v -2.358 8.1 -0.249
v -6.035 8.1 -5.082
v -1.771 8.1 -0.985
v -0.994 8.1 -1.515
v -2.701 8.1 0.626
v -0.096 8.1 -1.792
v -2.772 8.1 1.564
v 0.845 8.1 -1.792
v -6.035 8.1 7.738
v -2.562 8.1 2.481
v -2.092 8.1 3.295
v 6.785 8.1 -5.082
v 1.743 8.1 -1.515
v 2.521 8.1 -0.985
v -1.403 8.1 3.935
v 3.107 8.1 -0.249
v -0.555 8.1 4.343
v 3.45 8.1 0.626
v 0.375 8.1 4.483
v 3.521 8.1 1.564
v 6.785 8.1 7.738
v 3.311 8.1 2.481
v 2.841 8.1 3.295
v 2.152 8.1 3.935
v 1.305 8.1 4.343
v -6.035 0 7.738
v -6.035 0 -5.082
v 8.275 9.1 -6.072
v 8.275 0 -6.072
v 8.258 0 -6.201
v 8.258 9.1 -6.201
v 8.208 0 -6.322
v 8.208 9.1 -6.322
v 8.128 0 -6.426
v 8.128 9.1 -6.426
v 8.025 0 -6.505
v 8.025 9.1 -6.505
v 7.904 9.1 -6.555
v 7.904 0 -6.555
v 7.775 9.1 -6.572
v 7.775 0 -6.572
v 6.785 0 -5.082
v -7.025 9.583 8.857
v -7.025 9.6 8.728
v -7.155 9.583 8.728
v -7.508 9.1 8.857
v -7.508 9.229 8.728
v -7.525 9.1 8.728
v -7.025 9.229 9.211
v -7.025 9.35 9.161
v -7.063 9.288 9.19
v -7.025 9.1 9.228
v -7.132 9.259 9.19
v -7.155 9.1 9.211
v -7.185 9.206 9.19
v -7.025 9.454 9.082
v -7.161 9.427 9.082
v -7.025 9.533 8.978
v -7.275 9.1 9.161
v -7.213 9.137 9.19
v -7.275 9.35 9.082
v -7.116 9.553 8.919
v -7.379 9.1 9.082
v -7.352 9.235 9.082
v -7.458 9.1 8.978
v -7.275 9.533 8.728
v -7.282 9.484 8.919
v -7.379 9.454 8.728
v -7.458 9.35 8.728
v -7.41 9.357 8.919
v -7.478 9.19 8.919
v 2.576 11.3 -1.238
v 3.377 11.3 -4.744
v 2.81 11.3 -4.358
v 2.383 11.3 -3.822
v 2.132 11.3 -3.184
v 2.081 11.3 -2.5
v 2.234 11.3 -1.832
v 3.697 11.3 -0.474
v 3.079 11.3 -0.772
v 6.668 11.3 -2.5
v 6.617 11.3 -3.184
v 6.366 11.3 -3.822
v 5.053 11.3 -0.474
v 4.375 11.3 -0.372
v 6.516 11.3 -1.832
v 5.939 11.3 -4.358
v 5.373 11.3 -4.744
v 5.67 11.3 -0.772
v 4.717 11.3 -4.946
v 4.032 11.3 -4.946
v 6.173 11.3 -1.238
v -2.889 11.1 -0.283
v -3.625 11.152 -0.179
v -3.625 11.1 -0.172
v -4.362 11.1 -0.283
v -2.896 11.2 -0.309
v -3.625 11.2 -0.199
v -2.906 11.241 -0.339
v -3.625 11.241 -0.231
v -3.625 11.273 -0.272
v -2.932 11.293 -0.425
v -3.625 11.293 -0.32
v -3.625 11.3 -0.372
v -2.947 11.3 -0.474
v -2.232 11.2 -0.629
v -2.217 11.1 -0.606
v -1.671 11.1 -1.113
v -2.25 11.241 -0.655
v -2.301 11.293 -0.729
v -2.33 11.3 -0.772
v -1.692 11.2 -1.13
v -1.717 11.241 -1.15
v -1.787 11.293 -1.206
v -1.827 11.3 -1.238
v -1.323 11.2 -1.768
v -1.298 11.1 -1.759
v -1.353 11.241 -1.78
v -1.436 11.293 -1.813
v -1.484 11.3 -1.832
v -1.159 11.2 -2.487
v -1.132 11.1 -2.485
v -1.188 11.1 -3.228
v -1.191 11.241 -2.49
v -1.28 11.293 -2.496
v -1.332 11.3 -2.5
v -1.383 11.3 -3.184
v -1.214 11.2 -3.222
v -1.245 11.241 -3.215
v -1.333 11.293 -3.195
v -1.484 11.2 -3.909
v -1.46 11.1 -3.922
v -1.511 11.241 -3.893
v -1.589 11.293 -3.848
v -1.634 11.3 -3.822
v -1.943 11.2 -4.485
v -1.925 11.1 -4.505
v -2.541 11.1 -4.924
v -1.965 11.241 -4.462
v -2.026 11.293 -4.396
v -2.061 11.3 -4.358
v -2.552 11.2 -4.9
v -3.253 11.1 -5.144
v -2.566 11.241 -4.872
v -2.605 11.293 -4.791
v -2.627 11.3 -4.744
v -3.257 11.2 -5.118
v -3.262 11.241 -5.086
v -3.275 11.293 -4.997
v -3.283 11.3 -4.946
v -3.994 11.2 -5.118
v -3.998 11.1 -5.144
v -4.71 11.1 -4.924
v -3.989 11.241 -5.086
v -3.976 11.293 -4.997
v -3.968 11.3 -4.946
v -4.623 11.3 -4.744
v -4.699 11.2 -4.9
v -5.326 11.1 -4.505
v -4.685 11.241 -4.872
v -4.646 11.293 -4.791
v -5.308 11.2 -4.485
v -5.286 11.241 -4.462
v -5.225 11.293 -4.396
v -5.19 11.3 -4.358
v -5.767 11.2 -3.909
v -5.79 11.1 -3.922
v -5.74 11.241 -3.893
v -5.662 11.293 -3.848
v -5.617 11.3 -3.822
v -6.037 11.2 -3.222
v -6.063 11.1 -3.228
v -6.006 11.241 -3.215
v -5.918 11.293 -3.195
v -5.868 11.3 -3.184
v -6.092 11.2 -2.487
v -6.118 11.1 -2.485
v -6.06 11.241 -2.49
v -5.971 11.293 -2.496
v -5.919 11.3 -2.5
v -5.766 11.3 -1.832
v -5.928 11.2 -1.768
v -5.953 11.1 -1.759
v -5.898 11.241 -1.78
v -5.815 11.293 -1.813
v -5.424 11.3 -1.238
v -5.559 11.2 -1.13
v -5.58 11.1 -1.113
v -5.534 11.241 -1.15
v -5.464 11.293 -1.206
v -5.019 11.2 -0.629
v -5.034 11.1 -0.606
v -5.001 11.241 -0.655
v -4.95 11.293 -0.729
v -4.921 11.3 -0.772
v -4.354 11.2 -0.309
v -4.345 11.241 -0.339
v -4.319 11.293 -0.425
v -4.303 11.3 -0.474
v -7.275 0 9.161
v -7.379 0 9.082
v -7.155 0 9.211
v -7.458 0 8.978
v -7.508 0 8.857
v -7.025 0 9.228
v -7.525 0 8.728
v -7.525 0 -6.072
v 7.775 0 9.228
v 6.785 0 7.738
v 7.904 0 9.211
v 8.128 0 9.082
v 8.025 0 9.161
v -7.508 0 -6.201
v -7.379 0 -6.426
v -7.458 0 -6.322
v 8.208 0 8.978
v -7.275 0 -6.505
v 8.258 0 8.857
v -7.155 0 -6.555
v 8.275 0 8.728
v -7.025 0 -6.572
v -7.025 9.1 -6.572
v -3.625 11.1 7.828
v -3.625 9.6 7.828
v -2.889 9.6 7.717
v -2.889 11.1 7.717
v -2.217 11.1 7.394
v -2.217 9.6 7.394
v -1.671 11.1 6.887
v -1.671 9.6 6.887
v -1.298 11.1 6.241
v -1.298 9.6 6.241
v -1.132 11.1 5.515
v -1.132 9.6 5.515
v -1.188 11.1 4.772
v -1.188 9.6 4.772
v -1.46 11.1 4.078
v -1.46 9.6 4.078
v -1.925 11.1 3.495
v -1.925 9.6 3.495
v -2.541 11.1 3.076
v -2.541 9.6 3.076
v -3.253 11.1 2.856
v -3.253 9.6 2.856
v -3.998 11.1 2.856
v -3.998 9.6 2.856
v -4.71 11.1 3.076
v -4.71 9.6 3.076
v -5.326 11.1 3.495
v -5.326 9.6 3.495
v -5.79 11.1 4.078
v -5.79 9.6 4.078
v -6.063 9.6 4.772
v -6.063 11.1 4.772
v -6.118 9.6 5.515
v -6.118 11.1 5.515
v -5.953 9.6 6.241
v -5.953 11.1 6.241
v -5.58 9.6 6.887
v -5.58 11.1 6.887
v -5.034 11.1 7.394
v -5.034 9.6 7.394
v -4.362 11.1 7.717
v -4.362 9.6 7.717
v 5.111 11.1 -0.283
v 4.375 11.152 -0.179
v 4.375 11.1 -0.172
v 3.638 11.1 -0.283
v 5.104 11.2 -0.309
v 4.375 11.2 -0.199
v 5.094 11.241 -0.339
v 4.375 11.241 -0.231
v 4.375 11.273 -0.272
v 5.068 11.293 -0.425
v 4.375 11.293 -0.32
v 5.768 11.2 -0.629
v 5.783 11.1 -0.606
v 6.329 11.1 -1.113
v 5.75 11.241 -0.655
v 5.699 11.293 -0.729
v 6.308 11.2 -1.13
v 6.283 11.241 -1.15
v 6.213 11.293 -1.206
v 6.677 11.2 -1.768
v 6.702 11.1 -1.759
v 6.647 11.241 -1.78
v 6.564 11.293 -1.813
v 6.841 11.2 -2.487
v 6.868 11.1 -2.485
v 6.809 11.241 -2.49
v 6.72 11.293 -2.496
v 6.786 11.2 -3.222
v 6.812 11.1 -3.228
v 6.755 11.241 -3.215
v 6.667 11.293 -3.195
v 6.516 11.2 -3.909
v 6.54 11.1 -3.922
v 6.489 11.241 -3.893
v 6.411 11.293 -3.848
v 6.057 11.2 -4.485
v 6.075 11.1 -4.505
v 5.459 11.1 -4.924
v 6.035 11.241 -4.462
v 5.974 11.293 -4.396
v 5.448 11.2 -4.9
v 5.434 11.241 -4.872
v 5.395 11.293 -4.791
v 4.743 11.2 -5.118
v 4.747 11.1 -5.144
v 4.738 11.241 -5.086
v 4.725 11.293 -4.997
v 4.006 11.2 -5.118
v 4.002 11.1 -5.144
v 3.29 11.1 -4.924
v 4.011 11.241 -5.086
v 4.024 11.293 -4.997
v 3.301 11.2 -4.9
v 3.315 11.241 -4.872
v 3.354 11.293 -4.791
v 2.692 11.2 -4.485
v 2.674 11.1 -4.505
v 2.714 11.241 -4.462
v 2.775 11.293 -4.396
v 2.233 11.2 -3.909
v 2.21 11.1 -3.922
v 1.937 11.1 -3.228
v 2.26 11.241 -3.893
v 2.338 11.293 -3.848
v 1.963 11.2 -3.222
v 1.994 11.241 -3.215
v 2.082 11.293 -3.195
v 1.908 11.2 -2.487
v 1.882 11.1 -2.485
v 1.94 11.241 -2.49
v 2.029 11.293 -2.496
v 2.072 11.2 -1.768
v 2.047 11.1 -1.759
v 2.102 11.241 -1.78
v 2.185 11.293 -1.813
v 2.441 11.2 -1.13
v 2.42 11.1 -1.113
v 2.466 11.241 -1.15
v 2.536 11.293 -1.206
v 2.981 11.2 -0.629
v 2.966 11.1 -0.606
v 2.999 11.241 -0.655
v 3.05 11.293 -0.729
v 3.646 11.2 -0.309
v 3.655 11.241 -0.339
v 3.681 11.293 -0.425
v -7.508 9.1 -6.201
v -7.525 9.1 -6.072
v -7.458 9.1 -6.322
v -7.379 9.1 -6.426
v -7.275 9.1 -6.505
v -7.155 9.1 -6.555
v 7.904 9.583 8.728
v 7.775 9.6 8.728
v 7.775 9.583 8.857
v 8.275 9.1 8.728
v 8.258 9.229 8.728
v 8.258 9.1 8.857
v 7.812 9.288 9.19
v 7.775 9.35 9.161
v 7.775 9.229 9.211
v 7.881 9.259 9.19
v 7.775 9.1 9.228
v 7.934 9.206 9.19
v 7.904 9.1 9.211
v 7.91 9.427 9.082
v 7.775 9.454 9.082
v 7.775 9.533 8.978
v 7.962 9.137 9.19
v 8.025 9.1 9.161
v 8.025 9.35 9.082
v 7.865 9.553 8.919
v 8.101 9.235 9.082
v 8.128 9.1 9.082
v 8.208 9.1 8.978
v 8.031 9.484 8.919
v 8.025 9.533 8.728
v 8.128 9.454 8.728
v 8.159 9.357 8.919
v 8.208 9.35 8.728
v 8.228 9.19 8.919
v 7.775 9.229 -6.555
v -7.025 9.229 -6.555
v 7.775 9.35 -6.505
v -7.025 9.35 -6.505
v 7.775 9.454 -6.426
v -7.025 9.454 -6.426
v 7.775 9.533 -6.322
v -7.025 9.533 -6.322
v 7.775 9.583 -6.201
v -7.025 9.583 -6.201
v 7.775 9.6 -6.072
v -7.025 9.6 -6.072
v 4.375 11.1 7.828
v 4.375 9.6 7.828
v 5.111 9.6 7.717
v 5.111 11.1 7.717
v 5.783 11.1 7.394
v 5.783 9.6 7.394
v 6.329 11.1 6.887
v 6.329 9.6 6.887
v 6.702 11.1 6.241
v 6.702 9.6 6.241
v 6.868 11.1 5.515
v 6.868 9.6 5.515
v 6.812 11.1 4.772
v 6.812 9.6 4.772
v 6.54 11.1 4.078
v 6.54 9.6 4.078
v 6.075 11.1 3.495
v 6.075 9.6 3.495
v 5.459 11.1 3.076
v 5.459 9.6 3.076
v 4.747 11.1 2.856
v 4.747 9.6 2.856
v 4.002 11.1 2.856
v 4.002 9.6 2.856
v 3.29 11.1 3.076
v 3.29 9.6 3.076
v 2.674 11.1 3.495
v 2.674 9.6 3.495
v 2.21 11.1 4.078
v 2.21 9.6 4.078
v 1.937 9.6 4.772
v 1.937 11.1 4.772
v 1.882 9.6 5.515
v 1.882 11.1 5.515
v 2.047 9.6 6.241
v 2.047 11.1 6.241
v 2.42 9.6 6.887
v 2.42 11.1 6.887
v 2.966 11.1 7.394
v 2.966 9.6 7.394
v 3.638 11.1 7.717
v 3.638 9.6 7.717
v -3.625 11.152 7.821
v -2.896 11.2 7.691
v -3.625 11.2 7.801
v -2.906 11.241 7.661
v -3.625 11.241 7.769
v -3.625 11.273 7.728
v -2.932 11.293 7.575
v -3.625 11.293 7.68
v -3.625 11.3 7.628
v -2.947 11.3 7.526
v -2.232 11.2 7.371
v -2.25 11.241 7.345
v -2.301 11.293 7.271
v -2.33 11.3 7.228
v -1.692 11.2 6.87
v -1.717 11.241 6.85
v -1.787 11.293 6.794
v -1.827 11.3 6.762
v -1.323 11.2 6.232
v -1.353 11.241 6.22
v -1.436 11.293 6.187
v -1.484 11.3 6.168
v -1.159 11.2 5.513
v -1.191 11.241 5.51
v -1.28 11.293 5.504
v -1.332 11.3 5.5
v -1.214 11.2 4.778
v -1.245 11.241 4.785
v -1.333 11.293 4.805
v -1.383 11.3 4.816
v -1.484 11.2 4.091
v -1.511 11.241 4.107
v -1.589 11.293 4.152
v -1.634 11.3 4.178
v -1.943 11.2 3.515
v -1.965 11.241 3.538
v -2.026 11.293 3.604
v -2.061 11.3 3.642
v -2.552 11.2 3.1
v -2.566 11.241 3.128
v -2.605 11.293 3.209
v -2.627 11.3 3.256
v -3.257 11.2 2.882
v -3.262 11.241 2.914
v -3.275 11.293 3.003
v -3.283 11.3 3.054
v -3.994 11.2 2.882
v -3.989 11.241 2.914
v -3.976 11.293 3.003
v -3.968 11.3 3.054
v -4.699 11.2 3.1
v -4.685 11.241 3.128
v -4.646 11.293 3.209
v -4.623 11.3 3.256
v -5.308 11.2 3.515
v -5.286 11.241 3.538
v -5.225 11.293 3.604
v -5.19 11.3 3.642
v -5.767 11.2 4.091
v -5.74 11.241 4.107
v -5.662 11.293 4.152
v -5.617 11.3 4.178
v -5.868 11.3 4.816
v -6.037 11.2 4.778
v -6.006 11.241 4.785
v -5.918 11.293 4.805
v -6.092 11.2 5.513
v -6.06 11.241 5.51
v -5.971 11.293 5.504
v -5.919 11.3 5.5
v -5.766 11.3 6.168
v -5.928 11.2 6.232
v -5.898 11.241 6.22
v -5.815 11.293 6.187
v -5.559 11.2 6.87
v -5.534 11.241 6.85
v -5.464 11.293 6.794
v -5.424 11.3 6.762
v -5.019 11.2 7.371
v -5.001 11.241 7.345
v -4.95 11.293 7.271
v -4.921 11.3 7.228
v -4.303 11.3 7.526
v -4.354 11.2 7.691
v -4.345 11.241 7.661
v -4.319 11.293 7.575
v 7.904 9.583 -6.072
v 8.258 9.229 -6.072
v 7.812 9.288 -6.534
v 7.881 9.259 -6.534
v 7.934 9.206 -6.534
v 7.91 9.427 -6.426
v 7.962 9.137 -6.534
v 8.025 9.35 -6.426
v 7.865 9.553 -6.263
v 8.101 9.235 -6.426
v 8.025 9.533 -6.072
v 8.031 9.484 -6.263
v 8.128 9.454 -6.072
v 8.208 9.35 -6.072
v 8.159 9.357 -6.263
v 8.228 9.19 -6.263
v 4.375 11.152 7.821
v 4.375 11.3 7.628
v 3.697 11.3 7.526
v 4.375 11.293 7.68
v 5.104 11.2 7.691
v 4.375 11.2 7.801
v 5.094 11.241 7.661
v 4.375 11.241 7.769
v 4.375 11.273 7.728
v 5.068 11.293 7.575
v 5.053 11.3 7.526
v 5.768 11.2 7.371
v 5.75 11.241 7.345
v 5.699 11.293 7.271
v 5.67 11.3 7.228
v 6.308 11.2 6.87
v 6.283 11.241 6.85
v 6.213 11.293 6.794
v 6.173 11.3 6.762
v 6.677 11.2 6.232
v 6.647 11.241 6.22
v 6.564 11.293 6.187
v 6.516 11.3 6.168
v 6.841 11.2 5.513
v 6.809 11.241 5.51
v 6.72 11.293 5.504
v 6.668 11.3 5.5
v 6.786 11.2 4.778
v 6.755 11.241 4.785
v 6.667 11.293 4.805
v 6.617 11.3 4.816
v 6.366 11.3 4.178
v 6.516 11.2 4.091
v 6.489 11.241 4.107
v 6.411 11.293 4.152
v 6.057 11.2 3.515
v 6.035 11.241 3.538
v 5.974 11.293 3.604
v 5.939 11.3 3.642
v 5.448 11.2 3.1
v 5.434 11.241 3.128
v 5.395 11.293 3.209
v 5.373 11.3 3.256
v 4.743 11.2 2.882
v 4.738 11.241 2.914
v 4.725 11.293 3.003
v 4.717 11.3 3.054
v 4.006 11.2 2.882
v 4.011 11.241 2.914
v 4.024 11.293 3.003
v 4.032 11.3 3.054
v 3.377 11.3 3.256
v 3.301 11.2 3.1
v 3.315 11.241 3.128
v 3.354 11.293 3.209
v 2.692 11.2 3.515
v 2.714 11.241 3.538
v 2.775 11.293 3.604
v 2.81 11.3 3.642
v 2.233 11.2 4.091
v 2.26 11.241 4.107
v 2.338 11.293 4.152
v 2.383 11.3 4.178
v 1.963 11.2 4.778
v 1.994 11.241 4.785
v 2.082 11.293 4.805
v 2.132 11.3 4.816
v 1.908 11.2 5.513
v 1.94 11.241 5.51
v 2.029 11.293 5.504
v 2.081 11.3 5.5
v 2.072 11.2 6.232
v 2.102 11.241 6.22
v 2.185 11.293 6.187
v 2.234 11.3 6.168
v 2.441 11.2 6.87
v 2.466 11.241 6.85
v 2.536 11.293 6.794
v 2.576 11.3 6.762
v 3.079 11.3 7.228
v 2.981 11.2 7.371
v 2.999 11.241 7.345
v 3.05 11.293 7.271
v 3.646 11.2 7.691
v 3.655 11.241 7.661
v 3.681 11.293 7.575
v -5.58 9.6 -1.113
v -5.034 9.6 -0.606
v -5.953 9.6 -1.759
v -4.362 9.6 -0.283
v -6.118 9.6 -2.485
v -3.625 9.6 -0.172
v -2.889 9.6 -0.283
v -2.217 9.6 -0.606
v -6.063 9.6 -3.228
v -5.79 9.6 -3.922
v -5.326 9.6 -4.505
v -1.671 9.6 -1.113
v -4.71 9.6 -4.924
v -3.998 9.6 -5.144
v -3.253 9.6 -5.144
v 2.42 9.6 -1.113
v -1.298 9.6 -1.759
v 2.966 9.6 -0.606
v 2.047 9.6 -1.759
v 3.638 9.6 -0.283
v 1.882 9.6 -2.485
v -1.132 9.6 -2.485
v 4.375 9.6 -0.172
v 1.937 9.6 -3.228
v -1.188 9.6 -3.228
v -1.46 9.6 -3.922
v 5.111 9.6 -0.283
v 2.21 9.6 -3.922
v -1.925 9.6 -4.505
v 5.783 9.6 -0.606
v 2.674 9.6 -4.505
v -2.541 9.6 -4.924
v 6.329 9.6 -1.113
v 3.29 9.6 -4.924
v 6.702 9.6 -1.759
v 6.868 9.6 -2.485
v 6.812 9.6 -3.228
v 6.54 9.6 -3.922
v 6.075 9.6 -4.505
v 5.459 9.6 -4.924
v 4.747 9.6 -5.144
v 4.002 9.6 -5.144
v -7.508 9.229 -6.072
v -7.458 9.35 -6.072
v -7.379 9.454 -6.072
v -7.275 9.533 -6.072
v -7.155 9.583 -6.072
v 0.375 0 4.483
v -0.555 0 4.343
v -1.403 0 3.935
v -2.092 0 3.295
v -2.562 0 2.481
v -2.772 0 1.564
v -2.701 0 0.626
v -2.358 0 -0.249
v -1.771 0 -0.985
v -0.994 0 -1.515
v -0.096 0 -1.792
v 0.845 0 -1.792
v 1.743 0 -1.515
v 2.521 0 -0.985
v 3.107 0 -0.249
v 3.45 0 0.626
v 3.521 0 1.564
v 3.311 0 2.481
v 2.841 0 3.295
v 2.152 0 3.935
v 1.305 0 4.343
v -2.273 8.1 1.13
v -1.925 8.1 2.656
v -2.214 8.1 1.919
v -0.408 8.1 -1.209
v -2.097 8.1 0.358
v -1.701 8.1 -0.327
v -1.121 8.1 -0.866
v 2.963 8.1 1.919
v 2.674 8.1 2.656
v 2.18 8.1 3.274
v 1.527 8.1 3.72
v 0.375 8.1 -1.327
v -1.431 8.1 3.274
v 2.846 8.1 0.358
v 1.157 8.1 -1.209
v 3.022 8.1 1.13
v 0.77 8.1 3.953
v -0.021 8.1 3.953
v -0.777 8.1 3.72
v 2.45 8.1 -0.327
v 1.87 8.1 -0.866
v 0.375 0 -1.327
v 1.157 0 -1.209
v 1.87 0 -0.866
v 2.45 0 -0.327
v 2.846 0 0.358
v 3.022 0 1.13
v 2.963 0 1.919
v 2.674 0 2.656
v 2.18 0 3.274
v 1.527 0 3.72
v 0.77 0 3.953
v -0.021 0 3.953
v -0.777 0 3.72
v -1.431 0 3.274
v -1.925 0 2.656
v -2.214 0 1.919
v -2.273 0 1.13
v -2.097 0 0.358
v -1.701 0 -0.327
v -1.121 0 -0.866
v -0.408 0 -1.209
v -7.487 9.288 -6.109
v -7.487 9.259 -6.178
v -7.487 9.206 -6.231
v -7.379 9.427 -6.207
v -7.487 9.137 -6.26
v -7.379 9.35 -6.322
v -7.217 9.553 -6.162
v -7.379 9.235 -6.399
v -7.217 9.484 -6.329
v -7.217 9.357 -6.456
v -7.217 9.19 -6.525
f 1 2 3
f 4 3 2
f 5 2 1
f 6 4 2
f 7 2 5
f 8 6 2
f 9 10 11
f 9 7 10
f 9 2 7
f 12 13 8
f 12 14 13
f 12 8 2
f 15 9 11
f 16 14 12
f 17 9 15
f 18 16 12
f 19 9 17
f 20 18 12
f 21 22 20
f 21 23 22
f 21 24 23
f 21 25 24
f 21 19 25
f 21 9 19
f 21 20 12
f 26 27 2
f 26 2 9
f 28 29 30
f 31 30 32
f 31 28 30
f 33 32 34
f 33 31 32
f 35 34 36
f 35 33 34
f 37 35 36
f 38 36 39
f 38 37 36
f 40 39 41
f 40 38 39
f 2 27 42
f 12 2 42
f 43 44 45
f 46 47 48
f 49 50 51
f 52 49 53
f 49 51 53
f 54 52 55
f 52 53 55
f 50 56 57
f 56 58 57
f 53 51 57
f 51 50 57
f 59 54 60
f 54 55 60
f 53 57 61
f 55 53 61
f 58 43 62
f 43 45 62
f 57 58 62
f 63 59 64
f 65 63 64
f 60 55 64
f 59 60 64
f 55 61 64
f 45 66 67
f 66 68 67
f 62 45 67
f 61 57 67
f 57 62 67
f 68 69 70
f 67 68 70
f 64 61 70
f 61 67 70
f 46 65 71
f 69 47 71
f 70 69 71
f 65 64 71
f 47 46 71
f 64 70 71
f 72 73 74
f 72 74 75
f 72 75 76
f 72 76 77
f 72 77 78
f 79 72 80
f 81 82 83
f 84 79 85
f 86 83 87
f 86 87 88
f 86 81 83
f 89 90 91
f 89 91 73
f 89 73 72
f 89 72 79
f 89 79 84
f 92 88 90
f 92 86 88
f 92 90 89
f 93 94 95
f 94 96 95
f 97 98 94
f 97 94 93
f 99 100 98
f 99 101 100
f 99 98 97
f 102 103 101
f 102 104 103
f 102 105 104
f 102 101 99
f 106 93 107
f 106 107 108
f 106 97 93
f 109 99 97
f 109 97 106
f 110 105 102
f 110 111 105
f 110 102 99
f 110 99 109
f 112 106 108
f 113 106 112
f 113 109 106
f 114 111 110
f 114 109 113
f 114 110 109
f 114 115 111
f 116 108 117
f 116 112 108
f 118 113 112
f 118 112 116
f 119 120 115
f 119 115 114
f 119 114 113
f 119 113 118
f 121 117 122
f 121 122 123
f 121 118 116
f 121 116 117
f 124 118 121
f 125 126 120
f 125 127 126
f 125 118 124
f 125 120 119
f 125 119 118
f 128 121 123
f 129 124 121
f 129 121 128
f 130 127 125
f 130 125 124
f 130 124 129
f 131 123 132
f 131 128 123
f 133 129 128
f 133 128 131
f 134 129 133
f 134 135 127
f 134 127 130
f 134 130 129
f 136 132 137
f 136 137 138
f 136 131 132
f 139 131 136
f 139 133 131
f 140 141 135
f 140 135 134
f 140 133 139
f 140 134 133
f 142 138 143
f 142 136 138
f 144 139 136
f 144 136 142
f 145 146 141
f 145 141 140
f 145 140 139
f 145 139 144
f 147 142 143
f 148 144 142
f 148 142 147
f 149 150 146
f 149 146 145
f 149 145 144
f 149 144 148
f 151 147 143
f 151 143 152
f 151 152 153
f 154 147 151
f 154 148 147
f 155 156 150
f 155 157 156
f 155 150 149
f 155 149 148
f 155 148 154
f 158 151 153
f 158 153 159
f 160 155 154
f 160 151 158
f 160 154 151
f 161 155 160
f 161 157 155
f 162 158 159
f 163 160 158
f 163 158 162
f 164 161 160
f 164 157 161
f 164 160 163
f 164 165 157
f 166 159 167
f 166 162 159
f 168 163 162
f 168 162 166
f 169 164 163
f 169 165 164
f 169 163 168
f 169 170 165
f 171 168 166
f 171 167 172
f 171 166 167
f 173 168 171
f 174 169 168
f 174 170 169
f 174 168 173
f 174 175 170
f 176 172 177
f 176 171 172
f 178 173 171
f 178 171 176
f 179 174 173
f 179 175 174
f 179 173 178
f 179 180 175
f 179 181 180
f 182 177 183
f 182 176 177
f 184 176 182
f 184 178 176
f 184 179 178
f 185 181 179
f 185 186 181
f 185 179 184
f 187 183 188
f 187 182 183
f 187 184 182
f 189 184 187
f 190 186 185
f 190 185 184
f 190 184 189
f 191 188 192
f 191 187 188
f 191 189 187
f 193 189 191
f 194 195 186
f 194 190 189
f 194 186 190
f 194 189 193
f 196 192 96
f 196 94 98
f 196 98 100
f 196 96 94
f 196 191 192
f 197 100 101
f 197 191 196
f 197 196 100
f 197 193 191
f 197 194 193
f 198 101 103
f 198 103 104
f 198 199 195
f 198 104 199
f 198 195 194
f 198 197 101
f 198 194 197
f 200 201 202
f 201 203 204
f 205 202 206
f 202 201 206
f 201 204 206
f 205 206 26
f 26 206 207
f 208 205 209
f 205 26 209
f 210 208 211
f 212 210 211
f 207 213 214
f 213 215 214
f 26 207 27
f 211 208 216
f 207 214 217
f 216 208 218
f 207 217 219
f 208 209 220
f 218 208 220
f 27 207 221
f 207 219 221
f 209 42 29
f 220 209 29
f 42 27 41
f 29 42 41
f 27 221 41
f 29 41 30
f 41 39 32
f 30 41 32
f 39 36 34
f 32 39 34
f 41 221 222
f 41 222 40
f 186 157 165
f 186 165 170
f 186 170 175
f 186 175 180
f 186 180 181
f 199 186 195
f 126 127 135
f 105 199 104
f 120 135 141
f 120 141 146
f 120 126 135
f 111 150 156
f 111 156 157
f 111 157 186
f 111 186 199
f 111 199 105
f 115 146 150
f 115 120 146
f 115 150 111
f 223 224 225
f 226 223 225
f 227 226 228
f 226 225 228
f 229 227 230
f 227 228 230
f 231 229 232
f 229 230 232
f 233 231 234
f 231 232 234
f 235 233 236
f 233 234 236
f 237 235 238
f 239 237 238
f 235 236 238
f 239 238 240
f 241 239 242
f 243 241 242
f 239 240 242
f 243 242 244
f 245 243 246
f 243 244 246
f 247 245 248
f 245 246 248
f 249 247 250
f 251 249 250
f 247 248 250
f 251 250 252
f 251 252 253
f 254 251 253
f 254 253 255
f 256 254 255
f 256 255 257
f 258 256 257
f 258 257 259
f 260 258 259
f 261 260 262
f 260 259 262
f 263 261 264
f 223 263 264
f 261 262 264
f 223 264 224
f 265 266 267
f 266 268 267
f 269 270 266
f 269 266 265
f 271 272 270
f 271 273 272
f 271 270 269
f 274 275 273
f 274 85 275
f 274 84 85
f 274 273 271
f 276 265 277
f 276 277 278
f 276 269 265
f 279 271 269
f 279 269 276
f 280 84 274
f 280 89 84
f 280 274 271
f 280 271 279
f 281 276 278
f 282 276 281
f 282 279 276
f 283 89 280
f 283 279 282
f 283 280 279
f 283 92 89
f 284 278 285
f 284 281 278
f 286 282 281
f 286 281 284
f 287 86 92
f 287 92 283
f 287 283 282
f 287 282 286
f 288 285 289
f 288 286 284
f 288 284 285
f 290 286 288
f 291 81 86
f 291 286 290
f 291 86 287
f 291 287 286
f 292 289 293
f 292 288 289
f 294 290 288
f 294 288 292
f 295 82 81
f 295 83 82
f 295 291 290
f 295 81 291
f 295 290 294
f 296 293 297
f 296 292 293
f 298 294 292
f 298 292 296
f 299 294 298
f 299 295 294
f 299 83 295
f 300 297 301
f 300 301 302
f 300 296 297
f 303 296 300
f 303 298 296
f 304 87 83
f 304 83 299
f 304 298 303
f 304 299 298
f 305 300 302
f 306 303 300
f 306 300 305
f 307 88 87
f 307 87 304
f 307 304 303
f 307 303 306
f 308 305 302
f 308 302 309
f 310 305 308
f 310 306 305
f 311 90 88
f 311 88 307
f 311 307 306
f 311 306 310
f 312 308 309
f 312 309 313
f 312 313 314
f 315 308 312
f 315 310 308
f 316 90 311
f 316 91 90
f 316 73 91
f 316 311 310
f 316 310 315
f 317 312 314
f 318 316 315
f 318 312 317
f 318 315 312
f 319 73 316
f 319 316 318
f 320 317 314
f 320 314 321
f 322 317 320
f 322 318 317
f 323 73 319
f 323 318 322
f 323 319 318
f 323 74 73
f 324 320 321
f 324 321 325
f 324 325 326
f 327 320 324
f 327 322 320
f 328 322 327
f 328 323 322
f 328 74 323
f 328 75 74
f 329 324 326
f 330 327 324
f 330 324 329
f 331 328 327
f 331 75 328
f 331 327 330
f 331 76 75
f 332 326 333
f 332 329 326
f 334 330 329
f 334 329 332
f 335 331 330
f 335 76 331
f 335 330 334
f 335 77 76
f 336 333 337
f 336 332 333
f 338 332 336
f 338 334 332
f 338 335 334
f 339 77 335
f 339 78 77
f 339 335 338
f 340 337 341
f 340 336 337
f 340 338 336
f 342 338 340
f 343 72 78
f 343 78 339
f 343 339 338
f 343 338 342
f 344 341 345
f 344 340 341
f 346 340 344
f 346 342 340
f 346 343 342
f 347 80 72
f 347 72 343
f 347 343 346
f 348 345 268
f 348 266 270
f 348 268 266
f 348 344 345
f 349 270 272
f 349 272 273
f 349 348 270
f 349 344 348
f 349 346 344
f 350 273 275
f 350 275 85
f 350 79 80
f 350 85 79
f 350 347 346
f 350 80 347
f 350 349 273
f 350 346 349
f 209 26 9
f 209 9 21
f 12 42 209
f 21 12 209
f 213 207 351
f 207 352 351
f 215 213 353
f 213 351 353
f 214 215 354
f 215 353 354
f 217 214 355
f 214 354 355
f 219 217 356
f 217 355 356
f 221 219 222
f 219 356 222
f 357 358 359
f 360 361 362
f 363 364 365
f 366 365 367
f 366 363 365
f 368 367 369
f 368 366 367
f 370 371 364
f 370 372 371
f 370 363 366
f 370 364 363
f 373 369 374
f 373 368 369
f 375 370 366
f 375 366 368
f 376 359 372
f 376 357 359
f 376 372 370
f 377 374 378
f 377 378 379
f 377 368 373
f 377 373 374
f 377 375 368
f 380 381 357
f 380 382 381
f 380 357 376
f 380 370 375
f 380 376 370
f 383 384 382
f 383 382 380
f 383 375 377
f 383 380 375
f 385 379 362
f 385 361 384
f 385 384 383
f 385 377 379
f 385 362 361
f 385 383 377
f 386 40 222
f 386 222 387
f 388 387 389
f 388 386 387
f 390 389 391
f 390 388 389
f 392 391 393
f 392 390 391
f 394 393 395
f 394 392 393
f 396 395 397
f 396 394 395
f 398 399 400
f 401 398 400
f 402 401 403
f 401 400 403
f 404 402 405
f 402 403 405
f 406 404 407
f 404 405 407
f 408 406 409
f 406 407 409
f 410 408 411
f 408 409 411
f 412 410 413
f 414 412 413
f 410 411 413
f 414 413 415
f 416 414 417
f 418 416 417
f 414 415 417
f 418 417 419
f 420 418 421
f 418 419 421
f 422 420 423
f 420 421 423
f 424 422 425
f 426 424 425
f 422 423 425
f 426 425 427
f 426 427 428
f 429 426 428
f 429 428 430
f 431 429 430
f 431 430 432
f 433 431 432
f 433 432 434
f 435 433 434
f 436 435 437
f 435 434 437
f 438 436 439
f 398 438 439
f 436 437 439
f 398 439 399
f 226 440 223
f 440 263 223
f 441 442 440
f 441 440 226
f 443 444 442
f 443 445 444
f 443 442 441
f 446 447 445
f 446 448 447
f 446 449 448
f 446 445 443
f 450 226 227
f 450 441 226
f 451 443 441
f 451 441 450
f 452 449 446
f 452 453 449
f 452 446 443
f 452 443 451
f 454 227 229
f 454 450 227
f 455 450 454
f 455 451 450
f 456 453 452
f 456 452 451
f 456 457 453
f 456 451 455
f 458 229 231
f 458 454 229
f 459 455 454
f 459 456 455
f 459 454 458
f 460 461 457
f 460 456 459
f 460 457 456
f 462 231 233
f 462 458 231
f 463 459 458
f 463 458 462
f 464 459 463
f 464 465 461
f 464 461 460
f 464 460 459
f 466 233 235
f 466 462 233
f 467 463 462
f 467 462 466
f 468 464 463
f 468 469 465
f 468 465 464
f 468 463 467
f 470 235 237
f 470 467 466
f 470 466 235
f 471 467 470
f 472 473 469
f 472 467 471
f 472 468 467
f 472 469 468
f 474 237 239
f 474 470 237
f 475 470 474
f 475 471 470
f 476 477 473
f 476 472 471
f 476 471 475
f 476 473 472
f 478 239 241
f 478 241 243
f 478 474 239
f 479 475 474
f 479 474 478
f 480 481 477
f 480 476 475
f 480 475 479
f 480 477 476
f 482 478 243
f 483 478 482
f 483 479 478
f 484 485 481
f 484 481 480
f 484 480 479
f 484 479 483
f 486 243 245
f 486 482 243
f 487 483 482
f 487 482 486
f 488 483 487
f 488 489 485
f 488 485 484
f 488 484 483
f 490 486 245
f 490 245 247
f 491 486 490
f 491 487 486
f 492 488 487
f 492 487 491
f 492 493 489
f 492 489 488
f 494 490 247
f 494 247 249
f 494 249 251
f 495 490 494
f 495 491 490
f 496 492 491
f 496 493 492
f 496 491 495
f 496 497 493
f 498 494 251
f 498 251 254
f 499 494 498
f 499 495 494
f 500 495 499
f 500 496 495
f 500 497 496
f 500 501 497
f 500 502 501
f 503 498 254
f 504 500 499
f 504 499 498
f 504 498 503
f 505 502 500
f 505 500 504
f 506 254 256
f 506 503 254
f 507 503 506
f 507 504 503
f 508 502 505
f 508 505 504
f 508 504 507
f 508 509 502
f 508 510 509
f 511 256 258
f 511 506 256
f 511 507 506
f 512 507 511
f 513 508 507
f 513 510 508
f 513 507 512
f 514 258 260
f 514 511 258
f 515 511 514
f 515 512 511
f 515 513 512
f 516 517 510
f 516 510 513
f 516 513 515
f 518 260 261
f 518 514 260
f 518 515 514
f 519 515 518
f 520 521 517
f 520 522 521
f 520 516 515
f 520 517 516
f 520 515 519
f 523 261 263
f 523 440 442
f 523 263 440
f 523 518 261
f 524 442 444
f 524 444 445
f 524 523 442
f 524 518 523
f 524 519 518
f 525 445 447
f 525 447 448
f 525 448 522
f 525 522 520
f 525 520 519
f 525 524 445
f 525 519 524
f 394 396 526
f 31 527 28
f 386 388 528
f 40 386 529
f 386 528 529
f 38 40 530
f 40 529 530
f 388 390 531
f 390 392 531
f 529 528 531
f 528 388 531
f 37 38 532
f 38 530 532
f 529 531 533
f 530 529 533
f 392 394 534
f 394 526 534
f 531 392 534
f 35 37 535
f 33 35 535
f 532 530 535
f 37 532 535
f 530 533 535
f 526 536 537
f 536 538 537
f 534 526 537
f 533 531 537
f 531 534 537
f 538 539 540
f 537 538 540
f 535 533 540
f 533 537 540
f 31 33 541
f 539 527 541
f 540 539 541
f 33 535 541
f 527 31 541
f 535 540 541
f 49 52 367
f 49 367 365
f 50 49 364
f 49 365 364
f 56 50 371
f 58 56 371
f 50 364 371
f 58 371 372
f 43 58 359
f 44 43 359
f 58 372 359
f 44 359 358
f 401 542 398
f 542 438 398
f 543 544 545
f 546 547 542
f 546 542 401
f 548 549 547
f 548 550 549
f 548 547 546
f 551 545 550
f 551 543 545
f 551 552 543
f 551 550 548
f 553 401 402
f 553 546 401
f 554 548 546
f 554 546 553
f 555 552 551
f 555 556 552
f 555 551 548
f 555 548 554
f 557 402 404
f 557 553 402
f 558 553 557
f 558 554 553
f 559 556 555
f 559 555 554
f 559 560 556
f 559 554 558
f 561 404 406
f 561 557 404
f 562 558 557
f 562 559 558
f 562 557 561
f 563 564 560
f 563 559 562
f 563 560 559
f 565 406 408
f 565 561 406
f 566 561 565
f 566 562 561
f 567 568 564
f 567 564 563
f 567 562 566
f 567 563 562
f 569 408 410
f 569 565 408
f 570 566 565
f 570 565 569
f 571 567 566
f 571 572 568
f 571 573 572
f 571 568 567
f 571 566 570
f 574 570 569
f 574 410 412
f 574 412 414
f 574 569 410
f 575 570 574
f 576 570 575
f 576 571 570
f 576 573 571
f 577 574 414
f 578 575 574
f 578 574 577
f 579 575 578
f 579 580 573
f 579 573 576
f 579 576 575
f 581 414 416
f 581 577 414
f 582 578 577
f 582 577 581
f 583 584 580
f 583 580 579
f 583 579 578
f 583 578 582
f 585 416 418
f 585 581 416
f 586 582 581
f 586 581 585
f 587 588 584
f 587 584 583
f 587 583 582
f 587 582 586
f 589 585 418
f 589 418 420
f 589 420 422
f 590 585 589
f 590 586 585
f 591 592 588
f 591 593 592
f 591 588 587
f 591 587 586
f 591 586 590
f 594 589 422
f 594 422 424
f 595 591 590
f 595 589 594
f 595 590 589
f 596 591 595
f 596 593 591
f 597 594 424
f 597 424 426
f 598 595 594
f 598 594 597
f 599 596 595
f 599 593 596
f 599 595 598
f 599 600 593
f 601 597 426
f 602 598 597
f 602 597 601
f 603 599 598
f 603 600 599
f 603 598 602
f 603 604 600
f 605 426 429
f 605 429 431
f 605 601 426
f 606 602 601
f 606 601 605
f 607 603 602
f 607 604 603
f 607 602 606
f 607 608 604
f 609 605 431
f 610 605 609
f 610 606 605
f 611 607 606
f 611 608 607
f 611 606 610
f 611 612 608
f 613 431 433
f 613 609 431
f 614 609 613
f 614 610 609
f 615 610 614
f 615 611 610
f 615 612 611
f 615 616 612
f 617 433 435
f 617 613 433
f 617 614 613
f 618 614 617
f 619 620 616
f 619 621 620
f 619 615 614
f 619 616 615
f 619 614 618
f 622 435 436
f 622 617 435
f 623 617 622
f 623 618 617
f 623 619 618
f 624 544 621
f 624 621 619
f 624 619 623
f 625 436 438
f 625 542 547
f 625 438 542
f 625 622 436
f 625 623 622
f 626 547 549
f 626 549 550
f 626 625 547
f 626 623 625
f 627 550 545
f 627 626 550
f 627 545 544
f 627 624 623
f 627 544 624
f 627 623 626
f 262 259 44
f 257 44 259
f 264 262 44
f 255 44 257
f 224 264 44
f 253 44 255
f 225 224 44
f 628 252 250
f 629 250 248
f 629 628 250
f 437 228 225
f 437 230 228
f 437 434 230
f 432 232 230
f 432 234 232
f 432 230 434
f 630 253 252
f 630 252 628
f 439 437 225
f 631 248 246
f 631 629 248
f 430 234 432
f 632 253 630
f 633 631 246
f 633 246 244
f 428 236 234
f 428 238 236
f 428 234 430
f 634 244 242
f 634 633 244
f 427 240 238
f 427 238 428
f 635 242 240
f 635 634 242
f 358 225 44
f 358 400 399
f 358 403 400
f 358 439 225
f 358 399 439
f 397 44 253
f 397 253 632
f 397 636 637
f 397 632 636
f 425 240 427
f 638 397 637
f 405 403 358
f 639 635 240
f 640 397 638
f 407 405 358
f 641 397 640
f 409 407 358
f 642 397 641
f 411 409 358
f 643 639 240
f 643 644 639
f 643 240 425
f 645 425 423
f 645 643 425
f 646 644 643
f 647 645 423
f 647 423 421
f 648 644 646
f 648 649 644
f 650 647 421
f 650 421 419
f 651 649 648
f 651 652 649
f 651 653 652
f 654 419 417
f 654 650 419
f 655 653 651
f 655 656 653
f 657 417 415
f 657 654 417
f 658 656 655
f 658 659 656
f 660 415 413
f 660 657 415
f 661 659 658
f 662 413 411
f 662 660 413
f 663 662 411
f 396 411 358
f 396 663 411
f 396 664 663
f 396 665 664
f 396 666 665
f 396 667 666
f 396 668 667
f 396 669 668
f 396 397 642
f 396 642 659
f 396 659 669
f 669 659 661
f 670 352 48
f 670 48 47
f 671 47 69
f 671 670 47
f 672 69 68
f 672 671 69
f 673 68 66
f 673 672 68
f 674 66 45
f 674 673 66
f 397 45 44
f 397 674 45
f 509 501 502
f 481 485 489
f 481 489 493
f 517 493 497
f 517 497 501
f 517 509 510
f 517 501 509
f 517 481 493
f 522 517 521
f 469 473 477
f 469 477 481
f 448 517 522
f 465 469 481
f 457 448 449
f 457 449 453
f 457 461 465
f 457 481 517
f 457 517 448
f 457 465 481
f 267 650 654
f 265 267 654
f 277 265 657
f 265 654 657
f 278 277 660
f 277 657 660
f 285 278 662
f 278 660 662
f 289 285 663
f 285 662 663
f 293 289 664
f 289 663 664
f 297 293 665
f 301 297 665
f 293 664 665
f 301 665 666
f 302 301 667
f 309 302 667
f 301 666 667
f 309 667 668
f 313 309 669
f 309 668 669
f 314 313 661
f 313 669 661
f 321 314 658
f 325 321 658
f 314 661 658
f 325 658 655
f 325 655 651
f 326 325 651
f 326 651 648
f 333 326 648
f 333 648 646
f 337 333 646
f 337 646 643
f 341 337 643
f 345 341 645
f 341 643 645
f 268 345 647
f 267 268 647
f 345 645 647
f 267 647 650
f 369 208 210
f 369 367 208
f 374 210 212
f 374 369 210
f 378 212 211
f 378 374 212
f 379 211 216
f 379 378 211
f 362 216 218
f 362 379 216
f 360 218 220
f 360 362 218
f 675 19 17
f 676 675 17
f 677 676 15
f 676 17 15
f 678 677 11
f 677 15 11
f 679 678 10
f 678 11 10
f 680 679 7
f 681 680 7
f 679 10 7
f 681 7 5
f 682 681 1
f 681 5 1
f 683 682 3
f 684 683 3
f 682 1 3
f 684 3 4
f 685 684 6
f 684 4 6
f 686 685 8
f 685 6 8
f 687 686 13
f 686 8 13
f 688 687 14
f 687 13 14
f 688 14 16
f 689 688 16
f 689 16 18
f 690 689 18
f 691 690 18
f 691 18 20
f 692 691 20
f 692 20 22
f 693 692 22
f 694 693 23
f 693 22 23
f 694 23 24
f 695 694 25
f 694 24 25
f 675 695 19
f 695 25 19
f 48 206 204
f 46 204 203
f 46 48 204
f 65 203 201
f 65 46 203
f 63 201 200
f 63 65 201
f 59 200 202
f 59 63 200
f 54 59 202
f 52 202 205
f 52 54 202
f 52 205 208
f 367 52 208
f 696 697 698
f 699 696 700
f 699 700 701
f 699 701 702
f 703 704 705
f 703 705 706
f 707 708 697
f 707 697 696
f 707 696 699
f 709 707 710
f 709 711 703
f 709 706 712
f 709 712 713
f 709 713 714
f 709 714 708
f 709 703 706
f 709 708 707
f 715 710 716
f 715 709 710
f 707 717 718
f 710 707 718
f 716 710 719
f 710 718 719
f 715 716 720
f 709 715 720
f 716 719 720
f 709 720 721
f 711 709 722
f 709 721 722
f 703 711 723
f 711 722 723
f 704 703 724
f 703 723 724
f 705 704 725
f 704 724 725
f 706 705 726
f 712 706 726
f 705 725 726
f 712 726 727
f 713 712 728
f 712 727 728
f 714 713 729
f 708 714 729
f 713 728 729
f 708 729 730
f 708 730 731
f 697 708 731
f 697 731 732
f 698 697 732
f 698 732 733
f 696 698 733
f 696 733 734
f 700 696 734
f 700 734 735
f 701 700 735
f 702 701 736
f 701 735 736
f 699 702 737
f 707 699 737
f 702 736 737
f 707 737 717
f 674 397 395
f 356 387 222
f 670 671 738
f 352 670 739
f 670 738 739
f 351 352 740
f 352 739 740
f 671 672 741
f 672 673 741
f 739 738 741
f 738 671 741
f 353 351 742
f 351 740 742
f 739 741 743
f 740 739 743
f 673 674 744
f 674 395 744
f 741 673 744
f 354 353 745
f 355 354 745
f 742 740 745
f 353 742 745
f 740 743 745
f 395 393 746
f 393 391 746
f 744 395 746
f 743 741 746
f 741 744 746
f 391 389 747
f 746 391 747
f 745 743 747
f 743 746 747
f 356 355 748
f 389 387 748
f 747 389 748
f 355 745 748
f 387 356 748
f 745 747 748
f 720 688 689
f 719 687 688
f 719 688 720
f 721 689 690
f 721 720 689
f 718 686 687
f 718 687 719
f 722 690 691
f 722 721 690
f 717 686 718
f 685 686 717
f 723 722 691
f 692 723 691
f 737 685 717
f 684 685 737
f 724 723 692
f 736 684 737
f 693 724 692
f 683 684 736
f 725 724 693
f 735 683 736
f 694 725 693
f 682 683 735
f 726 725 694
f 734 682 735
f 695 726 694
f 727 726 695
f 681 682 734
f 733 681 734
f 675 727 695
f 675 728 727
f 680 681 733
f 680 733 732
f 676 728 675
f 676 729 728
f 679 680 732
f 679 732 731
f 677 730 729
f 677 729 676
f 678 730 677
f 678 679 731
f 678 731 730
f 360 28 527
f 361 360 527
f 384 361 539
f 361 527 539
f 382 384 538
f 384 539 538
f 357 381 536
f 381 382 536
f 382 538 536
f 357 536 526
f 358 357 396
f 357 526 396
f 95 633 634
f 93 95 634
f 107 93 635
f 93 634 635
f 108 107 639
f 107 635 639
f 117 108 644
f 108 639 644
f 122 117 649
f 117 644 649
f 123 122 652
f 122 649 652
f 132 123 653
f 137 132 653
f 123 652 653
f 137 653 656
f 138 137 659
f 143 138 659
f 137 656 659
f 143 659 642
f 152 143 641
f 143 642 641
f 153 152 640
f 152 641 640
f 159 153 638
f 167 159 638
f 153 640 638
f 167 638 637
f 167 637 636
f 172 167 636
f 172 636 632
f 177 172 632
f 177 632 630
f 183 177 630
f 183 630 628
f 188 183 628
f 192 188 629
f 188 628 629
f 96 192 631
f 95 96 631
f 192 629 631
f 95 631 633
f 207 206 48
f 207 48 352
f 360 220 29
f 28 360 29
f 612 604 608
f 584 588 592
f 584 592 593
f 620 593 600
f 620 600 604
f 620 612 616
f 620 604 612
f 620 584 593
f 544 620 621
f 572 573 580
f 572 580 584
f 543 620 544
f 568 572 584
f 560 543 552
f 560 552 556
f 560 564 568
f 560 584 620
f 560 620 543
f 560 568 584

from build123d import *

# Parameters (mm, degrees)
SKETCH1_W              = 15.8
SKETCH1_H              = 15.8
BOSS_EXTRUDE1_DEPTH    = 9.6
FILLET1_R              = 0.5
SKETCH2_W              = 12.82
SKETCH2_H              = 12.82
CUT_EXTRUDE1_DEPTH     = 8.1
SKETCH3_R              = 2.5
BOSS_EXTRUDE2_DEPTH    = 1.7
FILLET2_R              = 0.2
LPATTERN1_COUNT        = 2
LPATTERN1_PITCH        = 8
LPATTERN1_COUNT_DIR2   = 2
LPATTERN1_PITCH_DIR2   = 8
FILLET2_OF_LPATTERN1_R = 0.2
SKETCH4_R              = 3.155
BOSS_EXTRUDE3_DEPTH    = 8.1
SKETCH5_R              = 2.655
CUT_EXTRUDE2_DEPTH     = 8.1


with BuildPart() as part:
    # Sketch1 → Boss-Extrude1 (new body)
    with BuildSketch(Plane(origin=(0, 0, 0), x_dir=(1, 0, 0), z_dir=(0, 1, 0))):
        with Locations((0.374568966, -1.328017241)):
            Rectangle(SKETCH1_W, SKETCH1_H)
    extrude(amount=BOSS_EXTRUDE1_DEPTH)

    # Fillet1
    fillet1_edges = [part.edges().sort_by_distance(p)[0] for p in [
        (8.274568966, 9.6, 1.328017241),
        (0.374568966, 9.6, -6.571982759),
        (-7.525431034, 9.6, 1.328017241),
        (0.374568966, 9.6, 9.228017241),
        (-7.525431034, 4.8, -6.571982759),
        (8.274568966, 4.8, -6.571982759),
        (8.274568966, 4.8, 9.228017241),
        (-7.525431034, 4.8, 9.228017241),
    ]]
    fillet(fillet1_edges, radius=FILLET1_R)

    # Sketch2 → Cut-Extrude1 (cut)
    with BuildSketch(Plane.XZ):
        with Locations((0.374568966, 1.328017241)):
            Rectangle(SKETCH2_W, SKETCH2_H)
    extrude(amount=-CUT_EXTRUDE1_DEPTH, mode=Mode.SUBTRACT)

    # Sketch3 → Boss-Extrude2 (add)
    with BuildSketch(Plane(origin=(0, 9.6, 0), x_dir=(1, 0, 0), z_dir=(0, 1, 0))):
        with Locations(Location((-3.625431034, 2.671982759, 0), (0, 0, 270))):
            Circle(SKETCH3_R)
    boss_extrude2 = extrude(amount=BOSS_EXTRUDE2_DEPTH)

    # Fillet2
    fillet2_edges = [part.edges().sort_by_distance(p)[0] for p in [
        (-3.625431034, 11.3, -5.171982759),
    ]]
    fillet(fillet2_edges, radius=FILLET2_R)

    # LPattern1: Boss-Extrude2 2 × 2
    with Locations(*[(i * LPATTERN1_PITCH, 0, j * LPATTERN1_PITCH_DIR2) for i in range(LPATTERN1_COUNT) for j in range(LPATTERN1_COUNT_DIR2) if (i, j) != (0, 0)]):
        add(boss_extrude2)

    # Fillet2 of LPattern1
    fillet2_of_lpattern1_edges = [part.edges().sort_by_distance(p)[0] for p in [
        (-3.625431034, 11.3, 2.828017241),
        (4.374568966, 11.3, -5.171982759),
        (4.374568966, 11.3, 2.828017241),
    ]]
    fillet(fillet2_of_lpattern1_edges, radius=FILLET2_OF_LPATTERN1_R)

    # Sketch4 → Boss-Extrude3 (add)
    with BuildSketch(Plane.XZ.offset(-8.1)):
        with Locations(Location((0.374568966, 1.328017241, 0), (0, 0, 90))):
            Circle(SKETCH4_R)
    extrude(amount=BOSS_EXTRUDE3_DEPTH)

    # Sketch5 → Cut-Extrude2 (cut)
    with BuildSketch(Plane.XZ):
        with Locations(Location((0.374568966, 1.328017241, 0), (0, 0, 270))):
            Circle(SKETCH5_R)
    extrude(amount=-CUT_EXTRUDE2_DEPTH, mode=Mode.SUBTRACT)


solid = part.part
